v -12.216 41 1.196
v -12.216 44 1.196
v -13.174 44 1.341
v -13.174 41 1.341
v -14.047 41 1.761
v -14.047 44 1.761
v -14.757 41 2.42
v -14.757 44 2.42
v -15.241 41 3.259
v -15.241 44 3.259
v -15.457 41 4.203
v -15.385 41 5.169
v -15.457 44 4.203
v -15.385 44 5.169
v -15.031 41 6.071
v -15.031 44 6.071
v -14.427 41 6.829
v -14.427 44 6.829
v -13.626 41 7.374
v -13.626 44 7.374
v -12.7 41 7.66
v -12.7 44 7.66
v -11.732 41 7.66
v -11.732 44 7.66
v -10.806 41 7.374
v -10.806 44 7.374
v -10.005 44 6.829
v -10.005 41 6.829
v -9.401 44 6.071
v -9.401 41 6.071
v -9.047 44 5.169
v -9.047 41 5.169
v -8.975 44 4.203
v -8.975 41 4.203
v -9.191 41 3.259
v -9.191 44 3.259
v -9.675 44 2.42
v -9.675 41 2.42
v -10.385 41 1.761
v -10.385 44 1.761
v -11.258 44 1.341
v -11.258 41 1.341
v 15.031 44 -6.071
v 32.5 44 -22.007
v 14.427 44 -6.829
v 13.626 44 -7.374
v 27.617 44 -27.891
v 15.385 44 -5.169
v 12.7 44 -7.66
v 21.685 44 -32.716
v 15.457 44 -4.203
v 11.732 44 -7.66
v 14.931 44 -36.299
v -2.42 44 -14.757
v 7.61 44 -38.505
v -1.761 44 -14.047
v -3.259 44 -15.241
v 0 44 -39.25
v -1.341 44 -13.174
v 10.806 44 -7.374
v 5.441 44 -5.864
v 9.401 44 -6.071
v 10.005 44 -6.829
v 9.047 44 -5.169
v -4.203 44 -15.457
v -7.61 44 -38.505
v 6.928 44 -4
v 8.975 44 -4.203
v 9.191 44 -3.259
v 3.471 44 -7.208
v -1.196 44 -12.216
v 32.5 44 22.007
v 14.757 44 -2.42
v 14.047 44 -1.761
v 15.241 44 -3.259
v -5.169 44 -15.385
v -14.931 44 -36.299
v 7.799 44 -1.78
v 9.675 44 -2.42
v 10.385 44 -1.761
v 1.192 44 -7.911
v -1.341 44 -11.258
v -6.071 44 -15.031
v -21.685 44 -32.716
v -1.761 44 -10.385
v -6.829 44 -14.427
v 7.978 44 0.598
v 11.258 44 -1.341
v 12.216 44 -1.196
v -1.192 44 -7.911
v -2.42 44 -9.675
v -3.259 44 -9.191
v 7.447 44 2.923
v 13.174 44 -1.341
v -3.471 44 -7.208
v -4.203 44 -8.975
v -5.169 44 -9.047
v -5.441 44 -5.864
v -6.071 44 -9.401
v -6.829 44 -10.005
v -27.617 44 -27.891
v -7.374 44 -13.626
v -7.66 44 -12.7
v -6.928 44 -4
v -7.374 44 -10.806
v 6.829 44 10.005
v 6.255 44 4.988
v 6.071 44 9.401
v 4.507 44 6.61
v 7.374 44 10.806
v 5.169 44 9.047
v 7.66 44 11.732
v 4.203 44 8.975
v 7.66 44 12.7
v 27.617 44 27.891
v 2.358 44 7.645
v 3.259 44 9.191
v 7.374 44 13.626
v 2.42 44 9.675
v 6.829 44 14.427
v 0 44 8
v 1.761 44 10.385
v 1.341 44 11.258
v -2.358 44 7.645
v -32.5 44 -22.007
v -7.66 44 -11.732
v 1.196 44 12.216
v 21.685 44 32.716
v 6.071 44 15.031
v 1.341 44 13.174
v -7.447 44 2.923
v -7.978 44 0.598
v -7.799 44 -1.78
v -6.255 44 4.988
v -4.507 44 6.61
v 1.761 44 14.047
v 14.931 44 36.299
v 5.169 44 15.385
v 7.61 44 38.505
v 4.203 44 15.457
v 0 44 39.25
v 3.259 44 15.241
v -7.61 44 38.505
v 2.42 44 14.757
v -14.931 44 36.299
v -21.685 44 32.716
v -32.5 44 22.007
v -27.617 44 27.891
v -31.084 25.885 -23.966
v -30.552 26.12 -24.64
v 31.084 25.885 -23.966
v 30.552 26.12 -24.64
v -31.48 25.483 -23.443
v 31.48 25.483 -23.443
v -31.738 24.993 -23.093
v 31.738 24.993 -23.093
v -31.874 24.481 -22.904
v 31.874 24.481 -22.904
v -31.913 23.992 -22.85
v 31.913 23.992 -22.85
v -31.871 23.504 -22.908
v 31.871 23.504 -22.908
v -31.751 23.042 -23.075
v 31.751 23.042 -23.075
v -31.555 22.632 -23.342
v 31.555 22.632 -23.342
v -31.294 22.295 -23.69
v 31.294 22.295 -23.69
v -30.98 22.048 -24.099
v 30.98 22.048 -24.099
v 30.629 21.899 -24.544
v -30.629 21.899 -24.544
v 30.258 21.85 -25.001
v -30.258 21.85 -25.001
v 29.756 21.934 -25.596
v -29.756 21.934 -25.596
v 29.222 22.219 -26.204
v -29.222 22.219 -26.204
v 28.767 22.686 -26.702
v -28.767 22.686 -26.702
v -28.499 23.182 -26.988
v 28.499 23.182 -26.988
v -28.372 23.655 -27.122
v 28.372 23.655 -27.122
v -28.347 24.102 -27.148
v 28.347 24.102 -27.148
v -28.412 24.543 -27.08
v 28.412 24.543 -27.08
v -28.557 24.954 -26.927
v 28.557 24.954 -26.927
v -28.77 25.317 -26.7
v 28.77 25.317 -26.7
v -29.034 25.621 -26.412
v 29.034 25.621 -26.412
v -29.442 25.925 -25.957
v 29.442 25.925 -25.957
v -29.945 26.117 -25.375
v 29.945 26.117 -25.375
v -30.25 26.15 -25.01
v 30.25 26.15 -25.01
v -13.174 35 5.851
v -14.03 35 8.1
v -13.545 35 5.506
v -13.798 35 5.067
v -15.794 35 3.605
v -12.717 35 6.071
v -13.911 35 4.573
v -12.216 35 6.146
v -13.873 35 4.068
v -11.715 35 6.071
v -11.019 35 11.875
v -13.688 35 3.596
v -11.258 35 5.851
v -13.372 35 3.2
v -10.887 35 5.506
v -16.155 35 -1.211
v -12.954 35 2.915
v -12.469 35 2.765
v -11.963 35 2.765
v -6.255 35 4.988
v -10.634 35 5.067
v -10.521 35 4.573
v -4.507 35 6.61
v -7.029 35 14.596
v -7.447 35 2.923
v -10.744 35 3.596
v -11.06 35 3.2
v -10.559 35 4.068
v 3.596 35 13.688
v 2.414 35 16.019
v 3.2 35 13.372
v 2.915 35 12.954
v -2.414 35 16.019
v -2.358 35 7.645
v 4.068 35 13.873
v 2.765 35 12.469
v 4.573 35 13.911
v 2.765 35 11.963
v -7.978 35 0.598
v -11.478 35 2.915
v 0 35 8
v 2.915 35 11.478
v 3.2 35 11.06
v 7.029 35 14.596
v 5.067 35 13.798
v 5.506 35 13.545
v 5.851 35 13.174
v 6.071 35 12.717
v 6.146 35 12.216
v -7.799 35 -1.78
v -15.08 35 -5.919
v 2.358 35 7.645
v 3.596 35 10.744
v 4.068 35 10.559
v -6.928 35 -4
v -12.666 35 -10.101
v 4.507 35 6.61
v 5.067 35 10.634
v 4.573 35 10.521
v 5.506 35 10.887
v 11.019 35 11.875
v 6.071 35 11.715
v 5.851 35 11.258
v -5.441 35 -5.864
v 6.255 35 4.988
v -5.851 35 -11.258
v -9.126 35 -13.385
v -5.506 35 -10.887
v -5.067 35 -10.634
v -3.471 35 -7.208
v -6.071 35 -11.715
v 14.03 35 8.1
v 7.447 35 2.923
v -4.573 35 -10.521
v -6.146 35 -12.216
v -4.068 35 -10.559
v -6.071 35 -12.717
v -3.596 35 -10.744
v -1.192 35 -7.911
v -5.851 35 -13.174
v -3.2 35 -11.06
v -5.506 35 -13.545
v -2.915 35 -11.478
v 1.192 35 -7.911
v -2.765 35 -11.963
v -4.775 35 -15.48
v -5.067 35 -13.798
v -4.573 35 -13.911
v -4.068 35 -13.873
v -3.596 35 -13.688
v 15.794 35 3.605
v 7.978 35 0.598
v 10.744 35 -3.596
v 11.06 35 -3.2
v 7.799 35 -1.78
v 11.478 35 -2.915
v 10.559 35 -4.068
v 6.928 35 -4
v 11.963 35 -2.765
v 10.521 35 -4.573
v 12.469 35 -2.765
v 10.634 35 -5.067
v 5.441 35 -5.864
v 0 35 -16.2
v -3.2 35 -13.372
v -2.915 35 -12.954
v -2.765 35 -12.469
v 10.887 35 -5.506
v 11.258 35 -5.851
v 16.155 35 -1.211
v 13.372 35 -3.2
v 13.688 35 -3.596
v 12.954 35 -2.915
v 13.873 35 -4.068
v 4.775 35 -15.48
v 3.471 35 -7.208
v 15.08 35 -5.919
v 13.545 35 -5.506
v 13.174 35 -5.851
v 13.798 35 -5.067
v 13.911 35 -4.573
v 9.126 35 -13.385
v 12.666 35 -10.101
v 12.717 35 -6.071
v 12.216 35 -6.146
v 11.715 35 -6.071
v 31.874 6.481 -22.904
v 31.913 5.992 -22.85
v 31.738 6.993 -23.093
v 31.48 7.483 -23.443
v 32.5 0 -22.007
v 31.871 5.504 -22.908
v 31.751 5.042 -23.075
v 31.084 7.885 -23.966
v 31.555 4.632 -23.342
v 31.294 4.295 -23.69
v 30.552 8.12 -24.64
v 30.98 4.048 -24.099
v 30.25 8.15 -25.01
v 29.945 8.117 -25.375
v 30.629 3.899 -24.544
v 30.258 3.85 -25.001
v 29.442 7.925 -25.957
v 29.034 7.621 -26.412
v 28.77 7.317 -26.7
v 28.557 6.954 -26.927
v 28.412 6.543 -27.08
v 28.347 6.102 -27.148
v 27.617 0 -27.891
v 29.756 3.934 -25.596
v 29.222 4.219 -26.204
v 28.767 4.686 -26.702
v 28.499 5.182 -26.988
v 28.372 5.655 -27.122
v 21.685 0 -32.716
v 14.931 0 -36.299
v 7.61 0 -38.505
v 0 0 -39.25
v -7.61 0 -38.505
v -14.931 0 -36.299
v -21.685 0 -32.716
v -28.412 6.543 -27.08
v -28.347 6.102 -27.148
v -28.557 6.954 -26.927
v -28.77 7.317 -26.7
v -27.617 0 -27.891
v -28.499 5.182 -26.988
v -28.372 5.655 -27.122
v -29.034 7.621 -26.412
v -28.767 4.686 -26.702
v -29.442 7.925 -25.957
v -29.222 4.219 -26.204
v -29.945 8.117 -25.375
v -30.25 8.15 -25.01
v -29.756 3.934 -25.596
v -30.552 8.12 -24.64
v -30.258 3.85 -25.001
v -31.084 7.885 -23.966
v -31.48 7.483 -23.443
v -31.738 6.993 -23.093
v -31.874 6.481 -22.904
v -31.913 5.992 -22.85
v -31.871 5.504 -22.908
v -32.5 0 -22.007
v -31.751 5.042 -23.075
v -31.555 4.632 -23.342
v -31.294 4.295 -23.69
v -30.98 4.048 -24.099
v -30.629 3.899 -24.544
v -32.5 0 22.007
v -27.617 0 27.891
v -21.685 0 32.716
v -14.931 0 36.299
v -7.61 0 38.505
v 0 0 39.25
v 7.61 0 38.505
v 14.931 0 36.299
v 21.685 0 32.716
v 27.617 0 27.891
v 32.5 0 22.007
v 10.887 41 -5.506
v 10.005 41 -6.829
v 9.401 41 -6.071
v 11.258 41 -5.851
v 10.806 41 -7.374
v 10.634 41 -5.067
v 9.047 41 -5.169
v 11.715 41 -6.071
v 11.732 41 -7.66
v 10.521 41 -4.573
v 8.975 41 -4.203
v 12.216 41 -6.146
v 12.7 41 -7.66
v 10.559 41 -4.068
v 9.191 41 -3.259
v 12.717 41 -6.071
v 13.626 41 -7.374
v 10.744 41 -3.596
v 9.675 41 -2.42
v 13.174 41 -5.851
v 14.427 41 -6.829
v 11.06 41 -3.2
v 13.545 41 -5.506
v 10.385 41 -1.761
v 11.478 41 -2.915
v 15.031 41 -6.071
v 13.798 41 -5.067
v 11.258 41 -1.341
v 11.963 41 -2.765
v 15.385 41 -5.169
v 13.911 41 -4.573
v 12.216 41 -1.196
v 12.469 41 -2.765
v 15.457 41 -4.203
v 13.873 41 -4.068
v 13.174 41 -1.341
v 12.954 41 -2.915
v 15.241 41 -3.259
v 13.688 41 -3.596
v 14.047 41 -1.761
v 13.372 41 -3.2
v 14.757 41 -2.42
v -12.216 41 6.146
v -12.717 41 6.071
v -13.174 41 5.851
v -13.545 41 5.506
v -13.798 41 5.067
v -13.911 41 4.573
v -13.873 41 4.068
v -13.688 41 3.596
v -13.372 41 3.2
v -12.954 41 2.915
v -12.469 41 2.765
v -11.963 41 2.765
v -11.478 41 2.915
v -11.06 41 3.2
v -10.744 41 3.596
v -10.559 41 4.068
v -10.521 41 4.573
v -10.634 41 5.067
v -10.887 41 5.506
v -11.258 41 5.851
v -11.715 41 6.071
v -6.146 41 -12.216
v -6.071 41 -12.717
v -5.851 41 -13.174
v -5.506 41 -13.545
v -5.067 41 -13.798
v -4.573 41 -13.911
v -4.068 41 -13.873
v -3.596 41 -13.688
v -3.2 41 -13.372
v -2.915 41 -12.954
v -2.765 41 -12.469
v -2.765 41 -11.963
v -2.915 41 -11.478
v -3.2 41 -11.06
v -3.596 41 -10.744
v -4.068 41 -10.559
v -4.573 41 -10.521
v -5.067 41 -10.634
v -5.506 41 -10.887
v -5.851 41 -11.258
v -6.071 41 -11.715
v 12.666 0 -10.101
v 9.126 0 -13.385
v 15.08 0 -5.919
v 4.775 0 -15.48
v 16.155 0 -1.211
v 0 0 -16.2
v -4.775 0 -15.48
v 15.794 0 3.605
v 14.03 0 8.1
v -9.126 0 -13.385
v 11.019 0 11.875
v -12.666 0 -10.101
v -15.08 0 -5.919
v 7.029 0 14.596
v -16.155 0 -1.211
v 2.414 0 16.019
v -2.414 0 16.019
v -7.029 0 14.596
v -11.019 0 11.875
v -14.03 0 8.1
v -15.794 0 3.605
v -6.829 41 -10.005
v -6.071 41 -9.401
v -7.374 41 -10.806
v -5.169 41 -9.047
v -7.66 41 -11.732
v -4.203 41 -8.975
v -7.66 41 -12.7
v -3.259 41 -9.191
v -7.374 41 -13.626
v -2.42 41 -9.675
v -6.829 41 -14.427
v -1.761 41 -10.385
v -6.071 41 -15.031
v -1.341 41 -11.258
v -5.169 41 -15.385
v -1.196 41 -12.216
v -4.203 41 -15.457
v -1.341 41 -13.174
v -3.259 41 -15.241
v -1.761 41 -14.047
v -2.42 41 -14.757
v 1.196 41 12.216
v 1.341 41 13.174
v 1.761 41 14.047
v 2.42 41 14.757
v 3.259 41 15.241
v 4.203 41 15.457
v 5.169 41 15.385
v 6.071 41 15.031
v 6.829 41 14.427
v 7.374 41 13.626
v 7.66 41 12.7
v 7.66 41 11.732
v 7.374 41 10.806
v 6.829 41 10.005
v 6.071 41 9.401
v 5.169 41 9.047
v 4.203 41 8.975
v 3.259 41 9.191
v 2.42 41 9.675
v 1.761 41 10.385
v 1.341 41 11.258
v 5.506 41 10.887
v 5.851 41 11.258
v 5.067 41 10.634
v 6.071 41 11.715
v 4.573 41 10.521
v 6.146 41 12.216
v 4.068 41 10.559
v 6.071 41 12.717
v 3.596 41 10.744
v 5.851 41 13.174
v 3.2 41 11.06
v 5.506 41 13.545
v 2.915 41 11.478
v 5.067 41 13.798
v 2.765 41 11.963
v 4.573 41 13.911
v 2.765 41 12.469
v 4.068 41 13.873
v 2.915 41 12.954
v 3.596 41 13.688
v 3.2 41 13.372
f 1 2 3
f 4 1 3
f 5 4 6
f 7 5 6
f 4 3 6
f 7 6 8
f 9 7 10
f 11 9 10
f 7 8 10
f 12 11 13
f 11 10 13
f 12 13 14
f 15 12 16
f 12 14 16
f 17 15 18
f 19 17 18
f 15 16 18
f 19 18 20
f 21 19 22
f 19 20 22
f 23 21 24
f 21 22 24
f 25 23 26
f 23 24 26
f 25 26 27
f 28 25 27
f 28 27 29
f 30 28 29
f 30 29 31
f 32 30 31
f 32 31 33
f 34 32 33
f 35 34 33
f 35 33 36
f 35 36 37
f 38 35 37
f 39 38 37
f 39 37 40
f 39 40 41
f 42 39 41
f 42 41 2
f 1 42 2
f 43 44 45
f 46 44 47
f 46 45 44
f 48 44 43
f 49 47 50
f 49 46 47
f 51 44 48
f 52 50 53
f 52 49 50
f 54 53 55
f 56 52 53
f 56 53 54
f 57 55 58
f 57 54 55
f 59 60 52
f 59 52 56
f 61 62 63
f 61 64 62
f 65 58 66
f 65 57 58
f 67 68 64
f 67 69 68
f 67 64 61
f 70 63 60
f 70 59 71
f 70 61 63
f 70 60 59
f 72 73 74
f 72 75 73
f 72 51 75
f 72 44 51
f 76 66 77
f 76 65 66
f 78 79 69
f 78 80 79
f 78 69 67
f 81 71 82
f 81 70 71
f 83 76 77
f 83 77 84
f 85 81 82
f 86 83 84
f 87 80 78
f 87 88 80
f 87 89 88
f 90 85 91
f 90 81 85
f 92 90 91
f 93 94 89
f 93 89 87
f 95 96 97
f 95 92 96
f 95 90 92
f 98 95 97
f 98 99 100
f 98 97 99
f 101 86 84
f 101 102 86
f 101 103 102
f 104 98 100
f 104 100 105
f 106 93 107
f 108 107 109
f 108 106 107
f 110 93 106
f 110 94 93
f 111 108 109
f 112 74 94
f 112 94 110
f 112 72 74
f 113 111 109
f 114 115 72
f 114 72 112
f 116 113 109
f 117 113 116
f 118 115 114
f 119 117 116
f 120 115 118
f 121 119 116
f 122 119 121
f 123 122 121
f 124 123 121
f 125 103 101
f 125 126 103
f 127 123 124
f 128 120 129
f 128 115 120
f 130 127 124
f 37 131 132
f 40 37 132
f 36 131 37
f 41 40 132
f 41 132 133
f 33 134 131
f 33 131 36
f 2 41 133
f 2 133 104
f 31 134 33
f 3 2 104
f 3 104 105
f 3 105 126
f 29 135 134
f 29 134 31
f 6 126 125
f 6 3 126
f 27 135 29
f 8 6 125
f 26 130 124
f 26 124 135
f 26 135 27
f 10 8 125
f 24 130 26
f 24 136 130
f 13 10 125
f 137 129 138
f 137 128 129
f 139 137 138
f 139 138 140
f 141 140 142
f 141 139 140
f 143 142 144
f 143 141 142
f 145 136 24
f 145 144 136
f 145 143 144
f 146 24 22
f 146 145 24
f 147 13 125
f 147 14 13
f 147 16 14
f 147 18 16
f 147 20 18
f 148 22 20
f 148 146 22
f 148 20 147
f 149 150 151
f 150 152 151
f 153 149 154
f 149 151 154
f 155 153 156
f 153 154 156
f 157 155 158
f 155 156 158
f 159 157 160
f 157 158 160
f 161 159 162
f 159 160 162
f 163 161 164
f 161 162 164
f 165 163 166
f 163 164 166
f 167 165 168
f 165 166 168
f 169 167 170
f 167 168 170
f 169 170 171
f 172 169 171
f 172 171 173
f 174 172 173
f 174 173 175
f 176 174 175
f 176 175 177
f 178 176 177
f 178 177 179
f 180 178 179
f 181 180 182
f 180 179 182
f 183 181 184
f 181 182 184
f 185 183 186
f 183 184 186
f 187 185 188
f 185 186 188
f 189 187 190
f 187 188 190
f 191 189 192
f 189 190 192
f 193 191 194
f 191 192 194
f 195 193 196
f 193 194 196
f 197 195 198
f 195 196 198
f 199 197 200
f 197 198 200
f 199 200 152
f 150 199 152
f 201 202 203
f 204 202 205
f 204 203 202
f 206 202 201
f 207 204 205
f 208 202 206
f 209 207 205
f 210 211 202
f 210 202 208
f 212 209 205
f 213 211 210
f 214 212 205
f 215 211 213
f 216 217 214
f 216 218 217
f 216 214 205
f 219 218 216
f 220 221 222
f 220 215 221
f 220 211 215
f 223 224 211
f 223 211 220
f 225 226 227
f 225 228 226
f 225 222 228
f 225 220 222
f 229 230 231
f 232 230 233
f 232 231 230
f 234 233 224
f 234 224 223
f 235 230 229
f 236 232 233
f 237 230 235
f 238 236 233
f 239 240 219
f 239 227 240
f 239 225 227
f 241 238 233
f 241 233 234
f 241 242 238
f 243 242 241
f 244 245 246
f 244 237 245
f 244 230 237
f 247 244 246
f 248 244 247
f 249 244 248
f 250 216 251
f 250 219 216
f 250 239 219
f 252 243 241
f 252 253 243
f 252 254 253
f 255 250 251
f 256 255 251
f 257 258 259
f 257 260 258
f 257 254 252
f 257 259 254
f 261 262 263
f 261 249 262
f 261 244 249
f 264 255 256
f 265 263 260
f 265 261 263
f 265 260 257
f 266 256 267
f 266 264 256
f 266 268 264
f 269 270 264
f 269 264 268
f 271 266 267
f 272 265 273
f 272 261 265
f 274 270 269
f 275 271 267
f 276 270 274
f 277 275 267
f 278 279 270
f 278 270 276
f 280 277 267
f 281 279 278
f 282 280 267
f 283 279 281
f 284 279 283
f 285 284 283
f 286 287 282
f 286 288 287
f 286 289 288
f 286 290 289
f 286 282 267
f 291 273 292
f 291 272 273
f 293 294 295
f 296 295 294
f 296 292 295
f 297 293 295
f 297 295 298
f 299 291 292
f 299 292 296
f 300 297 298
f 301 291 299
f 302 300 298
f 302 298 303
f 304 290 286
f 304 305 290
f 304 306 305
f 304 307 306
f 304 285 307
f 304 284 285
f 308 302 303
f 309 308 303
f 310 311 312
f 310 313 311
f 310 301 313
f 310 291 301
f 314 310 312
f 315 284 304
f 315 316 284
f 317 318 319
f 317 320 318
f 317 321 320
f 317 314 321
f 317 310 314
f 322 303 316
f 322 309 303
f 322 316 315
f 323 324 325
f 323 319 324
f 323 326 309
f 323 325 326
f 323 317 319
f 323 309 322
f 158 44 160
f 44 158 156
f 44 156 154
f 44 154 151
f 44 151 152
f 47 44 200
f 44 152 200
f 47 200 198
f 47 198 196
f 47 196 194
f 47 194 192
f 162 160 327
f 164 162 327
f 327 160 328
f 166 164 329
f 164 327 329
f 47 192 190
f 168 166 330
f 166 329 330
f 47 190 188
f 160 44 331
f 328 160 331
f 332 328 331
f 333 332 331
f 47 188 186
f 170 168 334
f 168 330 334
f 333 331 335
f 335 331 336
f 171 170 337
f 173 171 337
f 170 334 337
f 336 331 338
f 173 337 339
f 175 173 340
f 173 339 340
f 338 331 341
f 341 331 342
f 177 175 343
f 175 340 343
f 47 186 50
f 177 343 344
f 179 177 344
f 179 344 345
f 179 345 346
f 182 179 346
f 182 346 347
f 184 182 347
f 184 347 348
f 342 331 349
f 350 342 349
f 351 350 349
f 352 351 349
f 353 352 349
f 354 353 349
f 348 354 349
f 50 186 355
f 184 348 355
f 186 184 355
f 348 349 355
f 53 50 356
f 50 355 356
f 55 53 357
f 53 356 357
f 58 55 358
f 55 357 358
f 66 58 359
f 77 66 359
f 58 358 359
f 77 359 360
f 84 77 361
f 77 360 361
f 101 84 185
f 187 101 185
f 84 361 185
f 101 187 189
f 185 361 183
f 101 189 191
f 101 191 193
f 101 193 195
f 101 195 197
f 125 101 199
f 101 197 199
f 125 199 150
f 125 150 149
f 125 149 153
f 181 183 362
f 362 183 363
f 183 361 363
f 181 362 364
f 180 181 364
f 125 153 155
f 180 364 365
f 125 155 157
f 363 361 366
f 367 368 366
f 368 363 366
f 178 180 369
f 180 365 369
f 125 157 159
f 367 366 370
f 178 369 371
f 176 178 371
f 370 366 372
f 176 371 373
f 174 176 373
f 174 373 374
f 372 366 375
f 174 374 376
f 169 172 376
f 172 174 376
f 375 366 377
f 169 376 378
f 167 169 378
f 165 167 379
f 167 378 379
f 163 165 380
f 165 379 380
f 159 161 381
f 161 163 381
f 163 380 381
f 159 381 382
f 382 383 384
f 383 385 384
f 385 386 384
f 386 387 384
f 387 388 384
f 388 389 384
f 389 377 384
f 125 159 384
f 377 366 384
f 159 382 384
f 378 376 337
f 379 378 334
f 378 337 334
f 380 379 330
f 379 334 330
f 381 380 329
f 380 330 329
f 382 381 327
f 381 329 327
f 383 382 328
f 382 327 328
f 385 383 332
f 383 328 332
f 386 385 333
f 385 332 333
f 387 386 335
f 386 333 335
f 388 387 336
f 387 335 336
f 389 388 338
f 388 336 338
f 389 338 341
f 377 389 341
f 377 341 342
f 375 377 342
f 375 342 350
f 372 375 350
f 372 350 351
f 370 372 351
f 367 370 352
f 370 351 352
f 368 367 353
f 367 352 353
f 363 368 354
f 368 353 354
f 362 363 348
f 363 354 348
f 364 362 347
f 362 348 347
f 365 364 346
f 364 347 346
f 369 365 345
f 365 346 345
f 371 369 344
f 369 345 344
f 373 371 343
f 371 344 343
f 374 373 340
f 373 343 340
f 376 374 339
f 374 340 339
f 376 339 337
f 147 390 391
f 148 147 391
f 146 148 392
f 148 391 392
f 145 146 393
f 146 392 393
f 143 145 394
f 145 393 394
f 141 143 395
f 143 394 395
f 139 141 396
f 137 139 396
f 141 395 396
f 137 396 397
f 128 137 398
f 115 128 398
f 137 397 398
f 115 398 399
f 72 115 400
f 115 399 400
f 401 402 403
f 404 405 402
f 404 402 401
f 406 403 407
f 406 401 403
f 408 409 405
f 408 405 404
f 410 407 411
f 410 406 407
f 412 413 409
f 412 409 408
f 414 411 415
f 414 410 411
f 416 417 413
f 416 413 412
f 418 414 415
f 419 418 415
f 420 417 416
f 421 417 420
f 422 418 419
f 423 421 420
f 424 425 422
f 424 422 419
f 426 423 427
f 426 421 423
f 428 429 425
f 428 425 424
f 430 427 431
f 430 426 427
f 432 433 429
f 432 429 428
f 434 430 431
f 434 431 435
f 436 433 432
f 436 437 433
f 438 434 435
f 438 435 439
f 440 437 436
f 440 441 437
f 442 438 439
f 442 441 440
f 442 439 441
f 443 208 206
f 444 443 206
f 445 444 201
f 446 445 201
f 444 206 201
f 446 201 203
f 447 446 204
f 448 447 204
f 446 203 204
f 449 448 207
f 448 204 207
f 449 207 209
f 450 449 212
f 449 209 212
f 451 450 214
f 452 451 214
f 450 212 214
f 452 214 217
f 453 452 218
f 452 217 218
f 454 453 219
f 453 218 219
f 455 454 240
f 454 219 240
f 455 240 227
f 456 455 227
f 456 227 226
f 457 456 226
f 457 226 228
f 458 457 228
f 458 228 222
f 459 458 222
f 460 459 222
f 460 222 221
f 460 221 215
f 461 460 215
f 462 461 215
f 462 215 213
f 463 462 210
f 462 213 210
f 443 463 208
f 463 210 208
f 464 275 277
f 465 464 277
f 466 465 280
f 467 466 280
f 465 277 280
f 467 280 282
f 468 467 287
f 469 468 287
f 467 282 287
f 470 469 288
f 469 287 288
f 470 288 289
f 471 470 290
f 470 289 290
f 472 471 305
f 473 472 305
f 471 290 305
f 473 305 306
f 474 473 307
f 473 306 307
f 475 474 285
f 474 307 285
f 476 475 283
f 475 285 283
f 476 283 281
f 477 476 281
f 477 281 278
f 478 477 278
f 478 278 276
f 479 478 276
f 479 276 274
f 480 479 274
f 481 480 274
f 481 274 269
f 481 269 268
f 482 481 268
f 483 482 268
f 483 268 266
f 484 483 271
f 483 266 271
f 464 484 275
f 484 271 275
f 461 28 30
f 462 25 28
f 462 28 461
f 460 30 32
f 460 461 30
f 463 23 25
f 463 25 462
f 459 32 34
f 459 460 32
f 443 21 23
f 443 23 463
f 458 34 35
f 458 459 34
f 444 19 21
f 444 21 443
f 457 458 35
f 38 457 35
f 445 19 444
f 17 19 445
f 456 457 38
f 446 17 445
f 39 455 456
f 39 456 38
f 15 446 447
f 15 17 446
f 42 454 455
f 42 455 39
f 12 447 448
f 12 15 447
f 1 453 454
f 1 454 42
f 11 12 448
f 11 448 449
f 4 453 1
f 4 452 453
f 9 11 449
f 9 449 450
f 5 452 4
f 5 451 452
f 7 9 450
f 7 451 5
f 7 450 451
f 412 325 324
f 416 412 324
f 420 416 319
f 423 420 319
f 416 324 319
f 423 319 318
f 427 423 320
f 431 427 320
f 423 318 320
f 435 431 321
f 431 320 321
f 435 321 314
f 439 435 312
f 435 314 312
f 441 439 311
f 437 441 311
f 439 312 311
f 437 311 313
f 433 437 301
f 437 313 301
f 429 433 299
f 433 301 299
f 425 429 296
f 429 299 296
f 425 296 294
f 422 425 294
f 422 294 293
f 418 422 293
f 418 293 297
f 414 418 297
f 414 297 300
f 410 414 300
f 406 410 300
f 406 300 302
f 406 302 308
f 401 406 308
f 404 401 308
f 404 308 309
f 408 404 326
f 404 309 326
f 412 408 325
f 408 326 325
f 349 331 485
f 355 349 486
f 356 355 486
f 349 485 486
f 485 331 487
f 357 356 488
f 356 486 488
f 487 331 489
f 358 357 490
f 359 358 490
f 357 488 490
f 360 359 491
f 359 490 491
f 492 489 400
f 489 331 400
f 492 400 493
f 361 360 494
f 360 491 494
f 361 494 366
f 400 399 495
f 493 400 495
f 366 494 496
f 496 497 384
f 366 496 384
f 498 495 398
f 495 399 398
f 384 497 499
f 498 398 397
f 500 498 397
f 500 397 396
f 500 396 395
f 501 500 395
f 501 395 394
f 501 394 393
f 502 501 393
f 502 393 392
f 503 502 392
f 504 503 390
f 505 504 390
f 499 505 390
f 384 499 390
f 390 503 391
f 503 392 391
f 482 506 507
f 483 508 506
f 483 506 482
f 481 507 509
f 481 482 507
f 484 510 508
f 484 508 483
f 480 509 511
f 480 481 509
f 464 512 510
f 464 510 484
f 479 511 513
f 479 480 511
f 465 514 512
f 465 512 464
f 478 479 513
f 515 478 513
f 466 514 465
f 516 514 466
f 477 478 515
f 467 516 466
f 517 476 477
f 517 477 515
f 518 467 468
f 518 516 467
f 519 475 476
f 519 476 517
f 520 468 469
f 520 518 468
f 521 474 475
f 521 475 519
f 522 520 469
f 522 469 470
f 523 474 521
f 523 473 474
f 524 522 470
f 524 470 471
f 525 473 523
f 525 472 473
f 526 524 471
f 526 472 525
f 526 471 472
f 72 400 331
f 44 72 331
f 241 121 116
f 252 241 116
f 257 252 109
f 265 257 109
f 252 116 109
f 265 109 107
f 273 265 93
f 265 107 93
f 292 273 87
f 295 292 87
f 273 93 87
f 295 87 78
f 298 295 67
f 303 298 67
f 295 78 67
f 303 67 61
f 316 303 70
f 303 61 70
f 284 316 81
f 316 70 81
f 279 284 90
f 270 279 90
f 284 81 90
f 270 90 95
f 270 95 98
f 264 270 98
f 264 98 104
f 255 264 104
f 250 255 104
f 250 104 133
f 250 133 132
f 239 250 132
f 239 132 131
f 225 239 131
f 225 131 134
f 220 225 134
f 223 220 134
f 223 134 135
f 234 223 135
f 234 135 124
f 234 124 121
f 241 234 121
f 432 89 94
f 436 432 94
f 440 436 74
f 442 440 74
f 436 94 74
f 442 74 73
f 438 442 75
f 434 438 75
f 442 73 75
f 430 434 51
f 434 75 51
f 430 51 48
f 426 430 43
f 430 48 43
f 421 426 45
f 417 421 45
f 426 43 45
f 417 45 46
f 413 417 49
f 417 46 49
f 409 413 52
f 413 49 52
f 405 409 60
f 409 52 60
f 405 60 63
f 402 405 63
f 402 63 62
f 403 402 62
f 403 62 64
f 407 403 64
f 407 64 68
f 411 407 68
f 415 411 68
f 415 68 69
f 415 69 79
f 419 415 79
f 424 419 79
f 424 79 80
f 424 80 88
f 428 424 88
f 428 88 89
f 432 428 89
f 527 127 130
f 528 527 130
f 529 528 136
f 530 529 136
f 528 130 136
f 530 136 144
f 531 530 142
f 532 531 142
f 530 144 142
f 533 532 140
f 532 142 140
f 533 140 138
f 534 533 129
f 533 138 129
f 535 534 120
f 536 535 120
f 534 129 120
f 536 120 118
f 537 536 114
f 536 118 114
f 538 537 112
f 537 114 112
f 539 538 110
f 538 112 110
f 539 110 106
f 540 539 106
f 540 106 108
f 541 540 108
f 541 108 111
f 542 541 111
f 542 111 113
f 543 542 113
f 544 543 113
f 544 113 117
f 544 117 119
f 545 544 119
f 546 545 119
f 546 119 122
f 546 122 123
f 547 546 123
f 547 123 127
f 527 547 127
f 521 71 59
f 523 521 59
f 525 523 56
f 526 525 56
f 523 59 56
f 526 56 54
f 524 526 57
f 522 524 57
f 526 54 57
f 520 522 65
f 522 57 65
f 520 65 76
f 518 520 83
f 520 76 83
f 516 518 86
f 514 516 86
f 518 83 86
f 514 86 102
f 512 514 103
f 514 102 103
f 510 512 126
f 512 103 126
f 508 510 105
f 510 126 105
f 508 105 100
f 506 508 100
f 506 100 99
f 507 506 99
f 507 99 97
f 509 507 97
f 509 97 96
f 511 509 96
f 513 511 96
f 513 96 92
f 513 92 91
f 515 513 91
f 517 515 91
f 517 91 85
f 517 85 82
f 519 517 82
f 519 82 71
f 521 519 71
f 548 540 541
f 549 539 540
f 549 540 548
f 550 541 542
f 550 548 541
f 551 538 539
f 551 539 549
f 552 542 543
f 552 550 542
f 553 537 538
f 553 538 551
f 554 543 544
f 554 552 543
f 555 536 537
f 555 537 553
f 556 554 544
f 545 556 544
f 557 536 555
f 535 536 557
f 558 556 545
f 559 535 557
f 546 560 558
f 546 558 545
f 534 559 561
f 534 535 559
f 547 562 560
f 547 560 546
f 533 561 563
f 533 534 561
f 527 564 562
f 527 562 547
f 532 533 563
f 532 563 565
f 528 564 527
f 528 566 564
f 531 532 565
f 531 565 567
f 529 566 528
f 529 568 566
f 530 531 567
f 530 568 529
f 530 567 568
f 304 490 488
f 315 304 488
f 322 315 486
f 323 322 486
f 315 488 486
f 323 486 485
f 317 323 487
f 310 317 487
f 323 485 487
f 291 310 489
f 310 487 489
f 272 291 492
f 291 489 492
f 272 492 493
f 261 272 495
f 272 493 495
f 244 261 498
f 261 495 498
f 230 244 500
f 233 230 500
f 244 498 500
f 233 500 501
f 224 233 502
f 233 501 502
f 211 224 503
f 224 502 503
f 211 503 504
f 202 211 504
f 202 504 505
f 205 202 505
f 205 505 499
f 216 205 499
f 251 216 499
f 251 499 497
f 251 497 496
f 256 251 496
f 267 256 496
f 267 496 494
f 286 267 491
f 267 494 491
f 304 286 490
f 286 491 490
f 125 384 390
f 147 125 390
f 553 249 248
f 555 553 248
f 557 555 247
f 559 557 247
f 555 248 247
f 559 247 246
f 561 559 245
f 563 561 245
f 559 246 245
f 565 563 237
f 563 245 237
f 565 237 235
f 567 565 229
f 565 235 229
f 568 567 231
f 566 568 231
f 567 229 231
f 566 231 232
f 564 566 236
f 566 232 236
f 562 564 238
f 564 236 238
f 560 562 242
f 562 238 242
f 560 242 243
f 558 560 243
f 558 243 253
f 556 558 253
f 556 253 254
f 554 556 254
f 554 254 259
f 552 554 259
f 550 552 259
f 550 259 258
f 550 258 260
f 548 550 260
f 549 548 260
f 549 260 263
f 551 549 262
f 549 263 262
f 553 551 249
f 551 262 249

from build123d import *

# Parameters (mm, degrees)
BOSS_EXTRUDE1_DEPTH            = 44
CBORE_FOR_M3_SHCS1_D           = 3.4
CBORE_FOR_M3_SHCS1_CBORE_D     = 6.5
CBORE_FOR_M3_SHCS1_CBORE_DEPTH = 3
CIRPATTERN1_COUNT              = 4
SKETCH4_R                      = 16.2
CUT_EXTRUDE1_DEPTH             = 35
SKETCH5_R                      = 8
CUT_EXTRUDE2_DEPTH             = 67.748127315
BOSS_EXTRUDE2_DEPTH            = 44
CBORE_FOR_M4_SHCS1_D           = 4.3
CBORE_FOR_M4_SHCS1_DEPTH       = 100.101198794
CBORE_FOR_M4_SHCS1_CBORE_D     = 8
CBORE_FOR_M4_SHCS1_CBORE_DEPTH = 4
CBORE_FOR_M4_SHCS1_TIP         = 1.291850331


with BuildPart() as part:
    # Sketch1 → Boss-Extrude1 (new body)
    with BuildSketch(Plane(origin=(0, 0, 0), x_dir=(1, 0, 0), z_dir=(0, 1, 0))):
        with BuildLine():
            Line((-32.5, 20.169593452), (-32.5, -20.169593452))
            ThreePointArc((-32.5, -20.169593452), (0, -38.25), (32.5, -20.169593452))
            Line((32.5, -20.169593452), (32.5, 20.169593452))
            ThreePointArc((32.5, 20.169593452), (0, 38.25), (-32.5, 20.169593452))
        make_face()
    extrude(amount=BOSS_EXTRUDE1_DEPTH)

    # CBORE for M3 SHCS1 (through all)
    with Locations(Plane(origin=(0, 44, 0), x_dir=(1, 0, 0), z_dir=(0, 1, 0))):
        with Locations((-4.446261863, 12.21600407)):
            cbore_for_m3_shcs1 = CounterBoreHole(CBORE_FOR_M3_SHCS1_D / 2, CBORE_FOR_M3_SHCS1_CBORE_D / 2, CBORE_FOR_M3_SHCS1_CBORE_DEPTH)

    # CirPattern1: CBORE for M3 SHCS1 ×4 about axis
    cirpattern1_axis = Axis((0, 0, 0), (0, 1, 0))
    for i in range(1, CIRPATTERN1_COUNT):
        add(cbore_for_m3_shcs1.rotate(cirpattern1_axis, i * 360 / CIRPATTERN1_COUNT), mode=Mode.SUBTRACT)

    # Sketch4 → Cut-Extrude1 (cut)
    with BuildSketch(Plane.XZ):
        with Locations(Location((0, 0, 0), (0, 0, 270))):
            Circle(SKETCH4_R)
    extrude(amount=-CUT_EXTRUDE1_DEPTH, mode=Mode.SUBTRACT)

    # Sketch5 → Cut-Extrude2 (cut, through all)
    with BuildSketch(Plane(origin=(0, 44, 0), x_dir=(1, 0, 0), z_dir=(0, 1, 0))):
        with Locations(Location((0, 0, 0), (0, 0, 270))):
            Circle(SKETCH5_R)
    extrude(amount=-CUT_EXTRUDE2_DEPTH, mode=Mode.SUBTRACT)

    # Sketch7 → Boss-Extrude2 (add)
    with BuildSketch(Plane.XZ):
        with BuildLine():
            Line((-32.5, 20.169593452), (-32.5, 22.007101127))
            ThreePointArc((-32.5, 22.007101127), (0, 39.25), (32.5, 22.007101127))
            Line((32.5, 22.007101127), (32.5, 20.169593452))
            ThreePointArc((32.5, 20.169593452), (0, 38.25), (-32.5, 20.169593452))
        make_face()
        with BuildLine():
            Line((32.5, -20.169593452), (32.5, -22.007101127))
            ThreePointArc((32.5, -22.007101127), (0, -39.25), (-32.5, -22.007101127))
            Line((-32.5, -22.007101127), (-32.5, -20.169593452))
            ThreePointArc((-32.5, -20.169593452), (0, -38.25), (32.5, -20.169593452))
        make_face()
    extrude(amount=-BOSS_EXTRUDE2_DEPTH)

    # CBORE for M4 SHCS1
    with Locations(Plane(origin=(-50.050599397, 499.724238547, -401.677021233), x_dir=(0, -0.9858598075393219, -0.16757219303491563), z_dir=(-1, 0, 0))):
        with Locations((405.876811742, 451.068889591), (423.622288278, 454.085189065)):
            CounterBoreHole(CBORE_FOR_M4_SHCS1_D / 2, CBORE_FOR_M4_SHCS1_CBORE_D / 2, CBORE_FOR_M4_SHCS1_CBORE_DEPTH, depth=CBORE_FOR_M4_SHCS1_DEPTH)
            with Locations((0, 0, -(CBORE_FOR_M4_SHCS1_DEPTH + CBORE_FOR_M4_SHCS1_TIP / 2))):  # 118° drill point
                Cone(0, CBORE_FOR_M4_SHCS1_D / 2, CBORE_FOR_M4_SHCS1_TIP, mode=Mode.SUBTRACT)


solid = part.part
